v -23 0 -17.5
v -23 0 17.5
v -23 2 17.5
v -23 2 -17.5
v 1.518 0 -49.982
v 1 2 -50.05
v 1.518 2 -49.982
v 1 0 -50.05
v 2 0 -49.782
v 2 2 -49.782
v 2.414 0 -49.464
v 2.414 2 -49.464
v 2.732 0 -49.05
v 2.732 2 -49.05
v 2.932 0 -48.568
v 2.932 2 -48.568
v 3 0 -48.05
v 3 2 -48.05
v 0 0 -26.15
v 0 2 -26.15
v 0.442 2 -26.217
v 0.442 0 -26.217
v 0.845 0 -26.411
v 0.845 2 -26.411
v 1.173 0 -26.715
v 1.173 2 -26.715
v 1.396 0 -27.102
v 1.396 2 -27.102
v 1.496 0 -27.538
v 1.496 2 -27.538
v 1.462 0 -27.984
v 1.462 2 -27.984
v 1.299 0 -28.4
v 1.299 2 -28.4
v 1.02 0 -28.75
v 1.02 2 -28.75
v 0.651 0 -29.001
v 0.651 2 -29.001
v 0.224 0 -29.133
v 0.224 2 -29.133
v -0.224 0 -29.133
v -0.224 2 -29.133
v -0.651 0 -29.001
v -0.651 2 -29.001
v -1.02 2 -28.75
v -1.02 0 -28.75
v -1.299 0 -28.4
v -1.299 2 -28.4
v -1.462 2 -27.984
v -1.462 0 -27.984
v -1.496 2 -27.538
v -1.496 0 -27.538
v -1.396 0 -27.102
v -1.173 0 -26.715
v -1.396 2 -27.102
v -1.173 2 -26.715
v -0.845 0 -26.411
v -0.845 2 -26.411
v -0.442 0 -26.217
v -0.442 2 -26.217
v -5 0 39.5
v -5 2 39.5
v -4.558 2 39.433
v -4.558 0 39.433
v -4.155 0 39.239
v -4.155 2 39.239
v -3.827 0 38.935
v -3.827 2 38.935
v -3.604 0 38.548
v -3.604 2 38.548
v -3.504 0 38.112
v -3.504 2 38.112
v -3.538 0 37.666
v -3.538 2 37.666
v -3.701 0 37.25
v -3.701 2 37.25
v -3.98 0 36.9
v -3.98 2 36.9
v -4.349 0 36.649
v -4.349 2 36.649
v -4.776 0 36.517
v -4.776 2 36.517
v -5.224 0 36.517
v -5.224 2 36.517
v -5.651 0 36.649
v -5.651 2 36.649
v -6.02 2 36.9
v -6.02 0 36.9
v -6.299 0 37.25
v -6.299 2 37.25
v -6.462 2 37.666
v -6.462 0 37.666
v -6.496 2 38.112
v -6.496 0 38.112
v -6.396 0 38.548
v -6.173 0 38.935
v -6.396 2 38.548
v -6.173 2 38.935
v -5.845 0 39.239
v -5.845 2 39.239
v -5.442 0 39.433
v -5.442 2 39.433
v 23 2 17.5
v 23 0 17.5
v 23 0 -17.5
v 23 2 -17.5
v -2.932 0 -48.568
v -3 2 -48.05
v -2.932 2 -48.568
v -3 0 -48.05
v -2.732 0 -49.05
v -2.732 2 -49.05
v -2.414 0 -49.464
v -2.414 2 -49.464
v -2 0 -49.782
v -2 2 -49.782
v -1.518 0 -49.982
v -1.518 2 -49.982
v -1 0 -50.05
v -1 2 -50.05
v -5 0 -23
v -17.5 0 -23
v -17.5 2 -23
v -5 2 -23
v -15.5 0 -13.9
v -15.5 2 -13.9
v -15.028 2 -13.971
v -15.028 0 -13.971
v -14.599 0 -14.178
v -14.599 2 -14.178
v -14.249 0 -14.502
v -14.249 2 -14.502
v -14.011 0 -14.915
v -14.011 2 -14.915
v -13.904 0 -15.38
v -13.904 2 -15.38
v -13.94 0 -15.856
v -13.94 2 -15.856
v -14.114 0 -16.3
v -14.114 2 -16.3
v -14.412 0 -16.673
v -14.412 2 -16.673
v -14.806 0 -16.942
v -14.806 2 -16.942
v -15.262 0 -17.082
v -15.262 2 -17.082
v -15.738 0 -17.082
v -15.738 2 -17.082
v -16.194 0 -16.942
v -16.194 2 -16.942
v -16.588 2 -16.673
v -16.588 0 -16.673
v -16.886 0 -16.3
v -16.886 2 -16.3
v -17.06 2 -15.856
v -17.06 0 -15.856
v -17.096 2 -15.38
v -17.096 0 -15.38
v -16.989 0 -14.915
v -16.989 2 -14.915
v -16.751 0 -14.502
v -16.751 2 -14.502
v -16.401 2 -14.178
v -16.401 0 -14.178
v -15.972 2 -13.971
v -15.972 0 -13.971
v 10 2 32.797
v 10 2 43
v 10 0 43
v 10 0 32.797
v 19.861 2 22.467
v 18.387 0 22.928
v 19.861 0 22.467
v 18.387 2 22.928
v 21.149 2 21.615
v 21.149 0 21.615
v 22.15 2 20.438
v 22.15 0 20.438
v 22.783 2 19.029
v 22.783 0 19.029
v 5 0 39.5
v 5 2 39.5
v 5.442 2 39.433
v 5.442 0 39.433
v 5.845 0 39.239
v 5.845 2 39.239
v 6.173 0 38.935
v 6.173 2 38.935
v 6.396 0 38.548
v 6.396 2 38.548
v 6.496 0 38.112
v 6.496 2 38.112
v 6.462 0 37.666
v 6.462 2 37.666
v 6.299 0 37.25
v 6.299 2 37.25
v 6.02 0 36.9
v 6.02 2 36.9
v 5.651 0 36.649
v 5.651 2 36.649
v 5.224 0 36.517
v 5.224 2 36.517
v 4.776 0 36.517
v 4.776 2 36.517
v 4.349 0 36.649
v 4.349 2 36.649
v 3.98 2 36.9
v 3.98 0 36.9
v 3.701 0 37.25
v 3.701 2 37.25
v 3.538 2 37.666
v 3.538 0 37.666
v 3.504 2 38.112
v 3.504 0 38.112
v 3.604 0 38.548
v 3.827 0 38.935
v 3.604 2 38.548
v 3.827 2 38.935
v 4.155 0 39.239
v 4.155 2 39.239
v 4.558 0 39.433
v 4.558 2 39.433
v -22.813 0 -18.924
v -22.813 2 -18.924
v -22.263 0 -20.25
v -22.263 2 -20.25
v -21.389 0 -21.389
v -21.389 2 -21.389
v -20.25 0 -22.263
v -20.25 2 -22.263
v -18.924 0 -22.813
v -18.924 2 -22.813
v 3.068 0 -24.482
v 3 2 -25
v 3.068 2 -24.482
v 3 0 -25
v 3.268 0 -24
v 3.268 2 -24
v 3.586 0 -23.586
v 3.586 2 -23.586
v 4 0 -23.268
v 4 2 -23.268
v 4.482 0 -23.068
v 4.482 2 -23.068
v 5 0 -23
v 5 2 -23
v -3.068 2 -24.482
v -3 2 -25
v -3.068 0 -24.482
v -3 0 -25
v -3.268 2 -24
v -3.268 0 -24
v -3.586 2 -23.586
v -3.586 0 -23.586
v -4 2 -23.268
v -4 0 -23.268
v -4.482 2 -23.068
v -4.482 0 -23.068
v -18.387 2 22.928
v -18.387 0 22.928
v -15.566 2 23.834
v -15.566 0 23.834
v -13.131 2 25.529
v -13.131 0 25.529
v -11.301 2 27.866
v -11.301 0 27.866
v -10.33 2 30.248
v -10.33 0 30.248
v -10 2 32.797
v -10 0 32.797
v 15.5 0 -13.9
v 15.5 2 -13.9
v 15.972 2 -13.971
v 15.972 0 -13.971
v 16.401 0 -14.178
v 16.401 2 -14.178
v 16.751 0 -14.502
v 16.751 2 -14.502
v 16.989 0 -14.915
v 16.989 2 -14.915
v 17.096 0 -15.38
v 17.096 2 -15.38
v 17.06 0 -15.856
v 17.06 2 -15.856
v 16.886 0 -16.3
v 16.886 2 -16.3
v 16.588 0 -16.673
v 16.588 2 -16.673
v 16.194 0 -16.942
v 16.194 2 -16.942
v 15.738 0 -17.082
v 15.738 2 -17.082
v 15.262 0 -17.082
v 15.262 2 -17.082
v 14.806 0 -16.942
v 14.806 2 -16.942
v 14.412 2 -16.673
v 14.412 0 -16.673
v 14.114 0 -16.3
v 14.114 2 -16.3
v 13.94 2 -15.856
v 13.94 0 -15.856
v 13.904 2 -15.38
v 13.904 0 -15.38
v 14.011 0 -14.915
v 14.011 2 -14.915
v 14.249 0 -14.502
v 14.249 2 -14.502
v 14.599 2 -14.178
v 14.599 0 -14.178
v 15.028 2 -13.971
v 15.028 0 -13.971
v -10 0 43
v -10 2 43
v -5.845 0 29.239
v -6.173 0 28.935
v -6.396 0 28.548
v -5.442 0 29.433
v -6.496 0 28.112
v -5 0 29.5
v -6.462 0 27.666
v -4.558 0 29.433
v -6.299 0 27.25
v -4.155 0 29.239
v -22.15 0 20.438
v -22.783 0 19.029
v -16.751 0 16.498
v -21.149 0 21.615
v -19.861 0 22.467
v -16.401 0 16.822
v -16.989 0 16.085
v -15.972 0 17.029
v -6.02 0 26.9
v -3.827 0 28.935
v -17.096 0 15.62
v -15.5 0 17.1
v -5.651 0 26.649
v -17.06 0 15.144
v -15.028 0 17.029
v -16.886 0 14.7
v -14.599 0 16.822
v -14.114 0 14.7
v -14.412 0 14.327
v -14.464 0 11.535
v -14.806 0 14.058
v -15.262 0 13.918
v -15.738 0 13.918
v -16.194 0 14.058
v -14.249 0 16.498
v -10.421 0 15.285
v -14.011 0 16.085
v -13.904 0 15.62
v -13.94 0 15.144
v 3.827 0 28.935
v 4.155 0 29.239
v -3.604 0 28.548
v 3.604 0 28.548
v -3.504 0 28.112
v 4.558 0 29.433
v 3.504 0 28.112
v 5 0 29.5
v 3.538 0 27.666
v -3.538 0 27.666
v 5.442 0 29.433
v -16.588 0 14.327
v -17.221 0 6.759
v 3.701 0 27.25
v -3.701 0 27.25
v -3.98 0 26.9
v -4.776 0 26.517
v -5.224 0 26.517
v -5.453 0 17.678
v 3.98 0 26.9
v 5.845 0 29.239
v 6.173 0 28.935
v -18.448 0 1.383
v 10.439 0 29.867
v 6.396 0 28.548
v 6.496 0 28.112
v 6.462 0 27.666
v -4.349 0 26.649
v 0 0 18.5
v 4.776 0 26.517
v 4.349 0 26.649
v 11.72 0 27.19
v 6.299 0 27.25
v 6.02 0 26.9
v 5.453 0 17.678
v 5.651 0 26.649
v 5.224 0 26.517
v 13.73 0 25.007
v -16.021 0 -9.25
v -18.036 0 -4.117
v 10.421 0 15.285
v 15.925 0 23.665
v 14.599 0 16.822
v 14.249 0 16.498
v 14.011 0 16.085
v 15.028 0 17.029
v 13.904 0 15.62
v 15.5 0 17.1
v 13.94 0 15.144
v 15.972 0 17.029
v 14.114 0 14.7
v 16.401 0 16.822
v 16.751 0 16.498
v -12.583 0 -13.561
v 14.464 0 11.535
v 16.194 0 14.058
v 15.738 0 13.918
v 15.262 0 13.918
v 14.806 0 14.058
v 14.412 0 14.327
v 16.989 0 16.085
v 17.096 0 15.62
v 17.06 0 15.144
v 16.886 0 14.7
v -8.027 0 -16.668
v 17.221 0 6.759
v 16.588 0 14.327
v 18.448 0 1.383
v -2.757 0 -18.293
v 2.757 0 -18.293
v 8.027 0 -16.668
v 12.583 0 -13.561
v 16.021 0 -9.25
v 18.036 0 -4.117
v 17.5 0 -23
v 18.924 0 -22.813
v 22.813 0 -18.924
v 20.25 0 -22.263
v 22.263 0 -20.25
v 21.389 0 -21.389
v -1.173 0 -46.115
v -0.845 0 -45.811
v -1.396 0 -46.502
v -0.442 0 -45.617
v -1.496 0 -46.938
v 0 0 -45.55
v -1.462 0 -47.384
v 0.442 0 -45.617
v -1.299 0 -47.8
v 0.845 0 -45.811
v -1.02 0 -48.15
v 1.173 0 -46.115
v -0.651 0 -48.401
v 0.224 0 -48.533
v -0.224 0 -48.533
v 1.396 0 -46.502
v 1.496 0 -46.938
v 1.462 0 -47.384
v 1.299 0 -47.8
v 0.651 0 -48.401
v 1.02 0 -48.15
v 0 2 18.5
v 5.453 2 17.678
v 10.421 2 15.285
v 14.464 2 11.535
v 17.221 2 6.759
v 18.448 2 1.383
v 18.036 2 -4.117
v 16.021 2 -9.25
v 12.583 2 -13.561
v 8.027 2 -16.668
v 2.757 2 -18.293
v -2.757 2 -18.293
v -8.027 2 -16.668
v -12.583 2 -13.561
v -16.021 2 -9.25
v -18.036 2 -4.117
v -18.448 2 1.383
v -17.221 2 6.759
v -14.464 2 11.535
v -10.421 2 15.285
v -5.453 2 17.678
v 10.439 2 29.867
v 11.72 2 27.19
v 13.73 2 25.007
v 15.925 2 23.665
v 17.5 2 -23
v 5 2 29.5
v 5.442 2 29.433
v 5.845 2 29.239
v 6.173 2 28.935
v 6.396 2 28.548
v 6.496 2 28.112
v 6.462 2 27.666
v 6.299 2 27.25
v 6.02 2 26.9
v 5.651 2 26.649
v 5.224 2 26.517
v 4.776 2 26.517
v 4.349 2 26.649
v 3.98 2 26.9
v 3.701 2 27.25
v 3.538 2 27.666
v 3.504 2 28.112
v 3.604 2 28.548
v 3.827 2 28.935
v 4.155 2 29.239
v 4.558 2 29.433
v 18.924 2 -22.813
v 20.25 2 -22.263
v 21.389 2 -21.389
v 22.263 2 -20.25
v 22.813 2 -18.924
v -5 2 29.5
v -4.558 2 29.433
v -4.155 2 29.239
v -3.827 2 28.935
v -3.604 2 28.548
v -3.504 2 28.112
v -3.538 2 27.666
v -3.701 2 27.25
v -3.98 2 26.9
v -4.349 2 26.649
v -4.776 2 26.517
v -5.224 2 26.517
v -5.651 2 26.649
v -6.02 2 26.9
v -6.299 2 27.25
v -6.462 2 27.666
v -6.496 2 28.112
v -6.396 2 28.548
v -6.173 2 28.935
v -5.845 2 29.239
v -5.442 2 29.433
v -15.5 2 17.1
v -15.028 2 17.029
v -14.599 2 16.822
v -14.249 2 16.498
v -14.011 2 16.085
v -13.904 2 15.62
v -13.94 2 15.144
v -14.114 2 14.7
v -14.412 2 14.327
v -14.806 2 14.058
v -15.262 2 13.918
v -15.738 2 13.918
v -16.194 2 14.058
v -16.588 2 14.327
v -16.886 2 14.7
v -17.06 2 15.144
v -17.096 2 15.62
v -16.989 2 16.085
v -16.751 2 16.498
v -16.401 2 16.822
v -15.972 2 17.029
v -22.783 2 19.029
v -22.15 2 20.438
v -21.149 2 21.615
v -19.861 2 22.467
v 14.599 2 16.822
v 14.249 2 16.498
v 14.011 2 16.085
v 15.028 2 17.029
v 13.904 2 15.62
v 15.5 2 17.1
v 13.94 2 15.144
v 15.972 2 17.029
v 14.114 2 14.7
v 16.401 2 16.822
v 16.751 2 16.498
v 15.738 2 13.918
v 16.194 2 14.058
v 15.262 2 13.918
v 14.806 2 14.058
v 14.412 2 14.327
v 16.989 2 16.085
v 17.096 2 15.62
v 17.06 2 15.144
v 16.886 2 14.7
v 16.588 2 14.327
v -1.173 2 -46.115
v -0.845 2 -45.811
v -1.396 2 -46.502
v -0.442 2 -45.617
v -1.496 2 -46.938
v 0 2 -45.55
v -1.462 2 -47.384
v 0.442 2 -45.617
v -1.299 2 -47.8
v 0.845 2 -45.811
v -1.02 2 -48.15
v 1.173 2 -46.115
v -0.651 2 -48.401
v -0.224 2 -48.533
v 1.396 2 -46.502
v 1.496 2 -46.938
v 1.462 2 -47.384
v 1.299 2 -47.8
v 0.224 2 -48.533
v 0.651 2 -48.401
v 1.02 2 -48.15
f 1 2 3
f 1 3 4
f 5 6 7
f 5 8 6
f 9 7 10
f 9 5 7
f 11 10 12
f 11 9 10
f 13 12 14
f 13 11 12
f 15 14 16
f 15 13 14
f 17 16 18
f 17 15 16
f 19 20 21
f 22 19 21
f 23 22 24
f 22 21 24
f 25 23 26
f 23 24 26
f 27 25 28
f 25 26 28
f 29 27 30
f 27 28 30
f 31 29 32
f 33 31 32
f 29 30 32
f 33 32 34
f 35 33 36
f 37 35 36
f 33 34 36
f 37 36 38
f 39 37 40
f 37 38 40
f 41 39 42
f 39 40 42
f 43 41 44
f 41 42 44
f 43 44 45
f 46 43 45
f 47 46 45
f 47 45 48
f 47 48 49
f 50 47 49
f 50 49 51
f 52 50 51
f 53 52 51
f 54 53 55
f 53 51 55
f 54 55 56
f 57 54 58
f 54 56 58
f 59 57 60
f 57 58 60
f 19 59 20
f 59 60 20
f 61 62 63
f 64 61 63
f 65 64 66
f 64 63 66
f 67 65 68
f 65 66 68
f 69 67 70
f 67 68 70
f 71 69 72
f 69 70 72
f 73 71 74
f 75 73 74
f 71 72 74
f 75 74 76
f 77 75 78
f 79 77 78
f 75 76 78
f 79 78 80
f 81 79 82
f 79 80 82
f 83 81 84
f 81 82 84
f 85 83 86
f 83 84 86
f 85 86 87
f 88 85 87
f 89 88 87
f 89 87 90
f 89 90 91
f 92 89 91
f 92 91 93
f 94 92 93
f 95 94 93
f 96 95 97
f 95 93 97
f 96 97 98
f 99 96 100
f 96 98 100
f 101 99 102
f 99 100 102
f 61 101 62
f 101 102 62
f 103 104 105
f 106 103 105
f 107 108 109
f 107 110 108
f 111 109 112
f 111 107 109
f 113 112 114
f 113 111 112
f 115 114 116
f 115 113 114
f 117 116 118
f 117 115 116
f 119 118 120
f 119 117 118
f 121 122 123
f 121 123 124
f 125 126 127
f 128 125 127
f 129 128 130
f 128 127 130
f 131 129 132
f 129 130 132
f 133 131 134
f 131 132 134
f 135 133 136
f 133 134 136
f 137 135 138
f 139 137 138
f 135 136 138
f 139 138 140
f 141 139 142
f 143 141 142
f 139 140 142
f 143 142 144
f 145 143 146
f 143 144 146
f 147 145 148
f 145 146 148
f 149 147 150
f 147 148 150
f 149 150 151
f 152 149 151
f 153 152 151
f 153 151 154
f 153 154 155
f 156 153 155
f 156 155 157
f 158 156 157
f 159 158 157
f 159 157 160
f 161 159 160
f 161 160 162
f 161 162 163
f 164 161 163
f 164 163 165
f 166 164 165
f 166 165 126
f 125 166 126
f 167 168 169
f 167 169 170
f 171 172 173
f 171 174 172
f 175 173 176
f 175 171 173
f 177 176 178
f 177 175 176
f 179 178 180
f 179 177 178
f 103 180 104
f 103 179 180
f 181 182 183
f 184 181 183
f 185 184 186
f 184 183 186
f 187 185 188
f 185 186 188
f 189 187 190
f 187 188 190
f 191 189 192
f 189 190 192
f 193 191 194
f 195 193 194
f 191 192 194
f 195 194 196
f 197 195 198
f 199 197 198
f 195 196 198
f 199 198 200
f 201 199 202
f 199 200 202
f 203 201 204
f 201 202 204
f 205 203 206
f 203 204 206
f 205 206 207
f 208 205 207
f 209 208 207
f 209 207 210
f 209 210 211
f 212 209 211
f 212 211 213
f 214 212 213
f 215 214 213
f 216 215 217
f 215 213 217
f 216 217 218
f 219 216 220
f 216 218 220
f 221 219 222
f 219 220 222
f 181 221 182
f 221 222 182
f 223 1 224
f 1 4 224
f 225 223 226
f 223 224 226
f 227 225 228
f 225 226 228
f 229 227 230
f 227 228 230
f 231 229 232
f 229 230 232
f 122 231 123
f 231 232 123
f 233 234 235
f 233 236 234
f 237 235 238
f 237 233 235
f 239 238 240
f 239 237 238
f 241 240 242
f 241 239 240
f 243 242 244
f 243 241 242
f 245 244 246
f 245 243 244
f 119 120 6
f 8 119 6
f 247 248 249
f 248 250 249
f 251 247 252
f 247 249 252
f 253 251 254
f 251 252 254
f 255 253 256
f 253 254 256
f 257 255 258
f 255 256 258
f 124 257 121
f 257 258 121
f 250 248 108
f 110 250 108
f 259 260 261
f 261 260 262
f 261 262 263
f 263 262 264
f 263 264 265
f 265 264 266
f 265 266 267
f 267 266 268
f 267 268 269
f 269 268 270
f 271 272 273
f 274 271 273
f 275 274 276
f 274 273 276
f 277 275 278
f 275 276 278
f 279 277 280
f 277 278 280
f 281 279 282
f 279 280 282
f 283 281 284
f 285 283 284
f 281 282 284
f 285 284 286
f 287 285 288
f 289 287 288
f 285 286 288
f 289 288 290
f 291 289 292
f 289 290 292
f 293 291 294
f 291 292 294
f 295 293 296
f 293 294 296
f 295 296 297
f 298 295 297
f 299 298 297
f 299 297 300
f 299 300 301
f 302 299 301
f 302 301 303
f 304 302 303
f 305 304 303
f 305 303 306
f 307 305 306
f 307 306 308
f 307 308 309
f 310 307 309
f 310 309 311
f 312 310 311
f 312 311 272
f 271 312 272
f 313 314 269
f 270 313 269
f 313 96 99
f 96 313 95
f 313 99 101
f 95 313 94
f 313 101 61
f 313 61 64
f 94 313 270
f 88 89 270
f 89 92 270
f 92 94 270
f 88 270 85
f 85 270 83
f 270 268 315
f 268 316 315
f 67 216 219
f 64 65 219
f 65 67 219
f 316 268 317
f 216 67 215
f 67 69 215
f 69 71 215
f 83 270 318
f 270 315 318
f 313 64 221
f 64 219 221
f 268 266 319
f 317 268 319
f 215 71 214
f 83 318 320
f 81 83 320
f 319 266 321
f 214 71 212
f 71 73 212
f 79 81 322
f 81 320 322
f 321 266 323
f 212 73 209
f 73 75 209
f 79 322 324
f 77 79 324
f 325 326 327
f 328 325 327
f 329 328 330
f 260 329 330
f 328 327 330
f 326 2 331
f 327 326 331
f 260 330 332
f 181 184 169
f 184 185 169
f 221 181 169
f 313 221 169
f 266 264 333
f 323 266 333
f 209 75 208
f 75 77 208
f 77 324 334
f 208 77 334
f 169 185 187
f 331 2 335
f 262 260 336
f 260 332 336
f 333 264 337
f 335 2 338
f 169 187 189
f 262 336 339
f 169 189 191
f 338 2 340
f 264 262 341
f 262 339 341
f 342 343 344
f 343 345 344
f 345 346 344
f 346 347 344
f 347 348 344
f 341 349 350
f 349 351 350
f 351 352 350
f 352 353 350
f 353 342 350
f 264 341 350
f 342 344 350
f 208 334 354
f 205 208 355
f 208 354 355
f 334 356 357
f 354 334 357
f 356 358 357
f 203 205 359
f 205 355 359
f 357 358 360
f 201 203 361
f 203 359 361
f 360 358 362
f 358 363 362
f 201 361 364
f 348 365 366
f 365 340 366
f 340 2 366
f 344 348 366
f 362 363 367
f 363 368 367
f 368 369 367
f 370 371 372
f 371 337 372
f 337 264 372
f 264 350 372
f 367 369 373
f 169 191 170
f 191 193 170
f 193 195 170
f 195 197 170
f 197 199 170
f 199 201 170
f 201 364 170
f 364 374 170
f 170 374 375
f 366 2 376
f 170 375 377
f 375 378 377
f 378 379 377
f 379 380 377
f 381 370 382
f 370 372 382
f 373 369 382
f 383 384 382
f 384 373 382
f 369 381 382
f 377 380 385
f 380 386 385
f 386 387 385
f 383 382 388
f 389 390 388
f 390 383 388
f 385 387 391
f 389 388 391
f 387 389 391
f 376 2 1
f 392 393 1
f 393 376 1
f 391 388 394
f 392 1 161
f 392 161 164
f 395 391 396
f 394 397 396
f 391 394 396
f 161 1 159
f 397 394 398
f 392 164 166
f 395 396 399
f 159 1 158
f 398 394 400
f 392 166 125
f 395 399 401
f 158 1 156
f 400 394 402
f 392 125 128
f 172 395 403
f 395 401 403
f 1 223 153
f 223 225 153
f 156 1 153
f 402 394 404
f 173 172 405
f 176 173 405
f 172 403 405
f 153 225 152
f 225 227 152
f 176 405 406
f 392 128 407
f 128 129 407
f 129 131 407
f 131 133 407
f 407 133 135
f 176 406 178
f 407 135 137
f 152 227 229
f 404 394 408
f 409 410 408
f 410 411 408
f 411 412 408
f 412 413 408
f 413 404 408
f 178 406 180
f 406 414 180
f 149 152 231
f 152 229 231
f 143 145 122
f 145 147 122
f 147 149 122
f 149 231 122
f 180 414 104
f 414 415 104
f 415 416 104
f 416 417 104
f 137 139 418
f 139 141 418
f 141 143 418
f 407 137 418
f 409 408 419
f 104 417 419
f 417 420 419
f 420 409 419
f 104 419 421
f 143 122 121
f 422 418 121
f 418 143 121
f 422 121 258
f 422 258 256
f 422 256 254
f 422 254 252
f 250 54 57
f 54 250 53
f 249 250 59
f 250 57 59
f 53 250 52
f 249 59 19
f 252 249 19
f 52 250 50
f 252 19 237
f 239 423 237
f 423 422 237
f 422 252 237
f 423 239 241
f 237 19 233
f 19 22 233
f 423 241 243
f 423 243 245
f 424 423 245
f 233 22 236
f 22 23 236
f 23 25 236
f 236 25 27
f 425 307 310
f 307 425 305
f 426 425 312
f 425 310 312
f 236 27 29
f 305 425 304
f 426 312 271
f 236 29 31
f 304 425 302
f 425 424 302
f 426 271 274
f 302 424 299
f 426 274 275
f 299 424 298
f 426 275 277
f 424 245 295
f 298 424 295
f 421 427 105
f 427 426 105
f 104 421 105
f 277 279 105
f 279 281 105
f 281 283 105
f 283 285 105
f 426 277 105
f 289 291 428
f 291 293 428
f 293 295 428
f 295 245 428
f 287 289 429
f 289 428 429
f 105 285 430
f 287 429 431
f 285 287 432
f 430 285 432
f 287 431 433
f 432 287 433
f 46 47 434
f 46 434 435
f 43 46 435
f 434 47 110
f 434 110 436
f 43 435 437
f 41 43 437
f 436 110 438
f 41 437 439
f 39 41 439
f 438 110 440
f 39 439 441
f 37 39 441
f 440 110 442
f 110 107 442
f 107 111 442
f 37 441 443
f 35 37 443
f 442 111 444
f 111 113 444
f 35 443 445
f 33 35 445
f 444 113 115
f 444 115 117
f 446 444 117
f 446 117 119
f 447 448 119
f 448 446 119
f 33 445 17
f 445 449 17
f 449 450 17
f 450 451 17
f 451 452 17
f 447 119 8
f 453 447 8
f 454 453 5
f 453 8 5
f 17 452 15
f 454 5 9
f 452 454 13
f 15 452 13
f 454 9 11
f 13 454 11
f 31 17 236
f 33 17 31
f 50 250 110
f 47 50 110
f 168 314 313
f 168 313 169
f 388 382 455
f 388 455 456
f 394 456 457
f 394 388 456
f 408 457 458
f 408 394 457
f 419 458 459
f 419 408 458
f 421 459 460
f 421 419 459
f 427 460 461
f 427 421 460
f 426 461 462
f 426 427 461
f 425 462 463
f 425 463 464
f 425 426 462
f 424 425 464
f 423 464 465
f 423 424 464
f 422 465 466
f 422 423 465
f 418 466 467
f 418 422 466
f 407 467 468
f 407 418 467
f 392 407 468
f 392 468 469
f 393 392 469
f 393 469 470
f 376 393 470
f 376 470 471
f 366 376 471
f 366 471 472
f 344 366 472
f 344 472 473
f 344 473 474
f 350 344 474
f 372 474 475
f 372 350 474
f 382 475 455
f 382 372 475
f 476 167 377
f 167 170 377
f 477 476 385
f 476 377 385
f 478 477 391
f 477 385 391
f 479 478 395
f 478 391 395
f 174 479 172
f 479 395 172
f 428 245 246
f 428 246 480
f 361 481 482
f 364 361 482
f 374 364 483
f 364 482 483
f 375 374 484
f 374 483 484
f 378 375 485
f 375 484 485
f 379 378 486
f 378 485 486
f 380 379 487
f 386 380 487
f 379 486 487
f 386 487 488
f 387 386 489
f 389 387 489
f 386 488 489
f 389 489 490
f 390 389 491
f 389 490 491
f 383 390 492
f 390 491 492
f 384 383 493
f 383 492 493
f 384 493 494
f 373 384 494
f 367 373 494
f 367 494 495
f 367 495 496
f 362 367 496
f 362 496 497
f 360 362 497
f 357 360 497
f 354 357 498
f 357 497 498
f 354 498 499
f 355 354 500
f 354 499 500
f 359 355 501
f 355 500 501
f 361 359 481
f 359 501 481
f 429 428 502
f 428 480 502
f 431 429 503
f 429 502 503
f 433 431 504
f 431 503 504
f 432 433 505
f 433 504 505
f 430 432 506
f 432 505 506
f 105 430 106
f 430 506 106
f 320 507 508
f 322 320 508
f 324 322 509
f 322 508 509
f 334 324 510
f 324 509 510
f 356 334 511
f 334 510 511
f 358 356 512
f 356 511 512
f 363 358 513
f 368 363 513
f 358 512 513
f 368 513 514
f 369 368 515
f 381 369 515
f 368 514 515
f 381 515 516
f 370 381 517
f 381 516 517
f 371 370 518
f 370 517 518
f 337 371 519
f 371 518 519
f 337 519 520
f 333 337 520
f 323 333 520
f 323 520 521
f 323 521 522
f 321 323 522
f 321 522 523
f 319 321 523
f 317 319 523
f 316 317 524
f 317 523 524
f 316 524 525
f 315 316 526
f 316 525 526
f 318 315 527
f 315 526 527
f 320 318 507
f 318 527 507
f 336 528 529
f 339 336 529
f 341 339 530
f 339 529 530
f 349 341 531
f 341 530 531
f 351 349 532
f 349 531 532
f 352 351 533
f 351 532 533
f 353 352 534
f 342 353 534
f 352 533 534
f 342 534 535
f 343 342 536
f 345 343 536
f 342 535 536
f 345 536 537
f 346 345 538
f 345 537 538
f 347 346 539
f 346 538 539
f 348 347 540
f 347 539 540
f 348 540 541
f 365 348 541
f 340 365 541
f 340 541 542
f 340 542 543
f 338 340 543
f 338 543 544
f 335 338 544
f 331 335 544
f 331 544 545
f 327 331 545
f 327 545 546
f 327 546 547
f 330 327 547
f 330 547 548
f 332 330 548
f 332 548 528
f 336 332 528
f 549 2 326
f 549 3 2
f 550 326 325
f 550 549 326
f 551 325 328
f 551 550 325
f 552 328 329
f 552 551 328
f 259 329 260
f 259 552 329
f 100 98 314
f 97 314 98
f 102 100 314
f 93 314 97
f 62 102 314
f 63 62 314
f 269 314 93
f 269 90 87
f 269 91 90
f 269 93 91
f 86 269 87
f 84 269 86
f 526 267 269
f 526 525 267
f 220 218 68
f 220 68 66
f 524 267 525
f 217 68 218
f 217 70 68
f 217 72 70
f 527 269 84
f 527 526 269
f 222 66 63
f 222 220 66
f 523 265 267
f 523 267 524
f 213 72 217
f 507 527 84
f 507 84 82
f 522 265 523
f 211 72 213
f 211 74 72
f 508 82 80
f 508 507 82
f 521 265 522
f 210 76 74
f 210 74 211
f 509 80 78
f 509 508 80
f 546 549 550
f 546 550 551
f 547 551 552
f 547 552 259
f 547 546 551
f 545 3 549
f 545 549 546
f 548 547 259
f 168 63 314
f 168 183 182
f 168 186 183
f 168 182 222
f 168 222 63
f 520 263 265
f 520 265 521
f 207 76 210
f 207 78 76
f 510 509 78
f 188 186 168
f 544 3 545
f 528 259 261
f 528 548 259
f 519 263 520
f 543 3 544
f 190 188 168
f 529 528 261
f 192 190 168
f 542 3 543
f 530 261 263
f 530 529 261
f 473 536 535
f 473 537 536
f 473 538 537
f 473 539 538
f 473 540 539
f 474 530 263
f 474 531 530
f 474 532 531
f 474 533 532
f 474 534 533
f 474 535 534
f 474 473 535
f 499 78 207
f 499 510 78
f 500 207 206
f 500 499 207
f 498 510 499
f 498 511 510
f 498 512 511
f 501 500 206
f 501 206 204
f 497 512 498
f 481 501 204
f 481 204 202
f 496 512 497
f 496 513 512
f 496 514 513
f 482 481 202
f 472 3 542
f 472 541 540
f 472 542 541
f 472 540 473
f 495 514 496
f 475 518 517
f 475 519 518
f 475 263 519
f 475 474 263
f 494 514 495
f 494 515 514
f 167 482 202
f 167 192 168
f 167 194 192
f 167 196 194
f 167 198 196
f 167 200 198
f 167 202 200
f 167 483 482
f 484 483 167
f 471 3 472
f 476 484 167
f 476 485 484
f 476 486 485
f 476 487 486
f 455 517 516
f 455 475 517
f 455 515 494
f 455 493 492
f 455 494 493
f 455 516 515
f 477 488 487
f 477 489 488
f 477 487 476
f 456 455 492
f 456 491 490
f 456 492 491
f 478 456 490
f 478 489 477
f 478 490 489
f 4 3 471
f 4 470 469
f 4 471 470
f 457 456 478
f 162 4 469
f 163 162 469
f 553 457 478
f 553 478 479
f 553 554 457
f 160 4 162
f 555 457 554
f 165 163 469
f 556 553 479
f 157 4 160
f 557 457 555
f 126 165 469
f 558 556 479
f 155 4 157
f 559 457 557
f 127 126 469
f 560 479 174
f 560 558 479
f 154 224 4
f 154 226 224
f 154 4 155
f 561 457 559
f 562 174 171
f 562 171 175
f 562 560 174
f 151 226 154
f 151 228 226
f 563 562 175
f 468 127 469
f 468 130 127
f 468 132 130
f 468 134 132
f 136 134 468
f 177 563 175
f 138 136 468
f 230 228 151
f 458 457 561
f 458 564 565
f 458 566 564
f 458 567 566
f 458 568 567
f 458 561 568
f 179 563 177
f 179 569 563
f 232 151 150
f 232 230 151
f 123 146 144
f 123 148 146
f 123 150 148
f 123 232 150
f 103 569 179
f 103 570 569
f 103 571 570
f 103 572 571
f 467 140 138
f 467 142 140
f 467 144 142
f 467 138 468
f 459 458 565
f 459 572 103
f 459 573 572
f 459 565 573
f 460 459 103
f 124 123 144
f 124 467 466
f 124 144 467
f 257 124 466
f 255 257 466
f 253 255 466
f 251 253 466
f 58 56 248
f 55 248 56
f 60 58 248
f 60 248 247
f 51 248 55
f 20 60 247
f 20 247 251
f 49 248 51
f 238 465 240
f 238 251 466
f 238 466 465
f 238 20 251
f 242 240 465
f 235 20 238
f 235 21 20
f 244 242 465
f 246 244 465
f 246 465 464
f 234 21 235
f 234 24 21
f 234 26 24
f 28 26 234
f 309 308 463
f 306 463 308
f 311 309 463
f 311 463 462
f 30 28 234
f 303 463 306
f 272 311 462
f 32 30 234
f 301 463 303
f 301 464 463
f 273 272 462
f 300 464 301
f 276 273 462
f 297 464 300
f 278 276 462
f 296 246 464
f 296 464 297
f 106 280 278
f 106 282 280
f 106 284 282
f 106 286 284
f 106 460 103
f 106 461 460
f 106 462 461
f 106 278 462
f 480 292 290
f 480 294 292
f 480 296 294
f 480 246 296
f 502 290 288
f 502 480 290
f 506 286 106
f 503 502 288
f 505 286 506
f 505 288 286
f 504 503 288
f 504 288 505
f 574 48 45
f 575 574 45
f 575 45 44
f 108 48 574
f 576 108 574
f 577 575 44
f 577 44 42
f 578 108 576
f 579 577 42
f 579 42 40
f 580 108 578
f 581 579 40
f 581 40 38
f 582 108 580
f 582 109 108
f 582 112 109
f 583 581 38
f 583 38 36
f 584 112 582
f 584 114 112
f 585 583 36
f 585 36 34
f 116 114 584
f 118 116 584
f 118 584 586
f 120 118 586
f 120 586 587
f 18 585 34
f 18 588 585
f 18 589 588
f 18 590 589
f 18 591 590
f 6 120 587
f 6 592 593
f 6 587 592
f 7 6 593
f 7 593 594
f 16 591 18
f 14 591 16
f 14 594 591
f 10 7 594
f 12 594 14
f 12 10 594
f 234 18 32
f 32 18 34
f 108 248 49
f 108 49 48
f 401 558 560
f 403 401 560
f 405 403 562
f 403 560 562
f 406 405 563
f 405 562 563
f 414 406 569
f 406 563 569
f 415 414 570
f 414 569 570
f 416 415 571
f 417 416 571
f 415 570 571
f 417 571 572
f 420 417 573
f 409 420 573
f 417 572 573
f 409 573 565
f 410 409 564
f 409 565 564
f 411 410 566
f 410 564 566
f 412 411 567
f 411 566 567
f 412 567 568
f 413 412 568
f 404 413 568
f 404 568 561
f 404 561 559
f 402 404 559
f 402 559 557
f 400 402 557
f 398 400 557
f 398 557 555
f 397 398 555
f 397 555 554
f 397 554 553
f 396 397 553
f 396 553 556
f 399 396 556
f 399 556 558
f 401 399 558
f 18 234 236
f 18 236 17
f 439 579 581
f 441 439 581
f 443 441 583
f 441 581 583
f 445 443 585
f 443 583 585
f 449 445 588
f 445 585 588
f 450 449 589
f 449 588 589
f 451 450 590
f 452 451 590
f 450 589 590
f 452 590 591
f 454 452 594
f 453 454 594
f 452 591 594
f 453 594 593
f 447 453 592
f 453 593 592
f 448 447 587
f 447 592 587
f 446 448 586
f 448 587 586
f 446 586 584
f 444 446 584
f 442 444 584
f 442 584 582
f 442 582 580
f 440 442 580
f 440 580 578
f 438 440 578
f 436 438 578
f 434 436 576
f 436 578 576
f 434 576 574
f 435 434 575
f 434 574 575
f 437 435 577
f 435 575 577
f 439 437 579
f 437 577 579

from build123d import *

# Parameters (mm, degrees)
SKETCH_2_W          = 46
SKETCH_2_H          = 46
SKETCH_2_R          = 18.5
EXTRUDE_1_DEPTH     = 2
FILLET_1_R          = 5.5
SKETCH_3_R          = 1.6
CUT_EXTRUDE_1_DEPTH = 33.588341474
SKETCH_4_W          = 20
SKETCH_4_H          = 20
SKETCH_4_R          = 1.5
EXTRUDE_2_DEPTH     = 2
SKETCH_5_W          = 6
SKETCH_5_H          = 27.4
SKETCH_5_R          = 1.5
EXTRUDE_3_DEPTH     = 2
FILLET_5_R          = 2
FILLET_6_R          = 10


with BuildPart() as part:
    # 草图2 → 凸台-拉伸1 (new body)
    with BuildSketch(Plane(origin=(0, 0, 0), x_dir=(1, 0, 0), z_dir=(0, 1, 0))):
        Rectangle(SKETCH_2_W, SKETCH_2_H)
        with Locations(Location((0, 0, 0), (0, 0, 270))):
            Circle(SKETCH_2_R, mode=Mode.SUBTRACT)
    extrude(amount=EXTRUDE_1_DEPTH)

    # 圆角1
    fillet_1_edges = [part.edges().sort_by_distance(p)[0] for p in [
        (23, 1, 23),
        (-23, 1, 23),
        (-23, 1, -23),
        (23, 1, -23),
    ]]
    fillet(fillet_1_edges, radius=FILLET_1_R)

    # 草图3 → 切除-拉伸1 (cut, through all)
    with BuildSketch(Plane(origin=(0, 2, 0), x_dir=(1, 0, 0), z_dir=(0, 1, 0))):
        with Locations(Location((-15.5, 15.5, 0), (0, 0, 270))):
            Circle(SKETCH_3_R)
        with Locations(Location((15.5, 15.5, 0), (0, 0, 270))):
            Circle(SKETCH_3_R)
        with Locations(Location((-15.5, -15.5, 0), (0, 0, 270))):
            Circle(SKETCH_3_R)
        with Locations(Location((15.5, -15.5, 0), (0, 0, 270))):
            Circle(SKETCH_3_R)
    extrude(amount=-CUT_EXTRUDE_1_DEPTH, mode=Mode.SUBTRACT)

    # 草图4 → 凸台-拉伸2 (add)
    with BuildSketch(Plane(origin=(0, 2, 0), x_dir=(1, 0, 0), z_dir=(0, 1, 0))):
        with Locations((0, -33)):
            Rectangle(SKETCH_4_W, SKETCH_4_H)
        with Locations(Location((-5, -38, 0), (0, 0, 270))):
            Circle(SKETCH_4_R, mode=Mode.SUBTRACT)
        with Locations(Location((5, -38, 0), (0, 0, 270))):
            Circle(SKETCH_4_R, mode=Mode.SUBTRACT)
        with Locations(Location((-5, -28, 0), (0, 0, 270))):
            Circle(SKETCH_4_R, mode=Mode.SUBTRACT)
        with Locations(Location((5, -28, 0), (0, 0, 270))):
            Circle(SKETCH_4_R, mode=Mode.SUBTRACT)
    extrude(amount=-EXTRUDE_2_DEPTH)

    # 草图5 → 凸台-拉伸3 (add)
    with BuildSketch(Plane(origin=(0, 2, 0), x_dir=(1, 0, 0), z_dir=(0, 1, 0))):
        with Locations((0, 36.350013022)):
            Rectangle(SKETCH_5_W, SKETCH_5_H)
        with Locations(Location((0, 47.050013022, 0), (0, 0, 270))):
            Circle(SKETCH_5_R, mode=Mode.SUBTRACT)
        with Locations(Location((0, 27.650013022, 0), (0, 0, 270))):
            Circle(SKETCH_5_R, mode=Mode.SUBTRACT)
    extrude(amount=-EXTRUDE_3_DEPTH)

    # 圆角5
    fillet_5_edges = [part.edges().sort_by_distance(p)[0] for p in [
        (-3, 1, -50.050013022),
        (3, 1, -50.050013022),
        (3, 1, -23),
        (-3, 1, -23),
    ]]
    fillet(fillet_5_edges, radius=FILLET_5_R)

    # 圆角6
    fillet_6_edges = [part.edges().sort_by_distance(p)[0] for p in [
        (10, 1, 23),
        (-10, 1, 23),
    ]]
    fillet(fillet_6_edges, radius=FILLET_6_R)


solid = part.part
